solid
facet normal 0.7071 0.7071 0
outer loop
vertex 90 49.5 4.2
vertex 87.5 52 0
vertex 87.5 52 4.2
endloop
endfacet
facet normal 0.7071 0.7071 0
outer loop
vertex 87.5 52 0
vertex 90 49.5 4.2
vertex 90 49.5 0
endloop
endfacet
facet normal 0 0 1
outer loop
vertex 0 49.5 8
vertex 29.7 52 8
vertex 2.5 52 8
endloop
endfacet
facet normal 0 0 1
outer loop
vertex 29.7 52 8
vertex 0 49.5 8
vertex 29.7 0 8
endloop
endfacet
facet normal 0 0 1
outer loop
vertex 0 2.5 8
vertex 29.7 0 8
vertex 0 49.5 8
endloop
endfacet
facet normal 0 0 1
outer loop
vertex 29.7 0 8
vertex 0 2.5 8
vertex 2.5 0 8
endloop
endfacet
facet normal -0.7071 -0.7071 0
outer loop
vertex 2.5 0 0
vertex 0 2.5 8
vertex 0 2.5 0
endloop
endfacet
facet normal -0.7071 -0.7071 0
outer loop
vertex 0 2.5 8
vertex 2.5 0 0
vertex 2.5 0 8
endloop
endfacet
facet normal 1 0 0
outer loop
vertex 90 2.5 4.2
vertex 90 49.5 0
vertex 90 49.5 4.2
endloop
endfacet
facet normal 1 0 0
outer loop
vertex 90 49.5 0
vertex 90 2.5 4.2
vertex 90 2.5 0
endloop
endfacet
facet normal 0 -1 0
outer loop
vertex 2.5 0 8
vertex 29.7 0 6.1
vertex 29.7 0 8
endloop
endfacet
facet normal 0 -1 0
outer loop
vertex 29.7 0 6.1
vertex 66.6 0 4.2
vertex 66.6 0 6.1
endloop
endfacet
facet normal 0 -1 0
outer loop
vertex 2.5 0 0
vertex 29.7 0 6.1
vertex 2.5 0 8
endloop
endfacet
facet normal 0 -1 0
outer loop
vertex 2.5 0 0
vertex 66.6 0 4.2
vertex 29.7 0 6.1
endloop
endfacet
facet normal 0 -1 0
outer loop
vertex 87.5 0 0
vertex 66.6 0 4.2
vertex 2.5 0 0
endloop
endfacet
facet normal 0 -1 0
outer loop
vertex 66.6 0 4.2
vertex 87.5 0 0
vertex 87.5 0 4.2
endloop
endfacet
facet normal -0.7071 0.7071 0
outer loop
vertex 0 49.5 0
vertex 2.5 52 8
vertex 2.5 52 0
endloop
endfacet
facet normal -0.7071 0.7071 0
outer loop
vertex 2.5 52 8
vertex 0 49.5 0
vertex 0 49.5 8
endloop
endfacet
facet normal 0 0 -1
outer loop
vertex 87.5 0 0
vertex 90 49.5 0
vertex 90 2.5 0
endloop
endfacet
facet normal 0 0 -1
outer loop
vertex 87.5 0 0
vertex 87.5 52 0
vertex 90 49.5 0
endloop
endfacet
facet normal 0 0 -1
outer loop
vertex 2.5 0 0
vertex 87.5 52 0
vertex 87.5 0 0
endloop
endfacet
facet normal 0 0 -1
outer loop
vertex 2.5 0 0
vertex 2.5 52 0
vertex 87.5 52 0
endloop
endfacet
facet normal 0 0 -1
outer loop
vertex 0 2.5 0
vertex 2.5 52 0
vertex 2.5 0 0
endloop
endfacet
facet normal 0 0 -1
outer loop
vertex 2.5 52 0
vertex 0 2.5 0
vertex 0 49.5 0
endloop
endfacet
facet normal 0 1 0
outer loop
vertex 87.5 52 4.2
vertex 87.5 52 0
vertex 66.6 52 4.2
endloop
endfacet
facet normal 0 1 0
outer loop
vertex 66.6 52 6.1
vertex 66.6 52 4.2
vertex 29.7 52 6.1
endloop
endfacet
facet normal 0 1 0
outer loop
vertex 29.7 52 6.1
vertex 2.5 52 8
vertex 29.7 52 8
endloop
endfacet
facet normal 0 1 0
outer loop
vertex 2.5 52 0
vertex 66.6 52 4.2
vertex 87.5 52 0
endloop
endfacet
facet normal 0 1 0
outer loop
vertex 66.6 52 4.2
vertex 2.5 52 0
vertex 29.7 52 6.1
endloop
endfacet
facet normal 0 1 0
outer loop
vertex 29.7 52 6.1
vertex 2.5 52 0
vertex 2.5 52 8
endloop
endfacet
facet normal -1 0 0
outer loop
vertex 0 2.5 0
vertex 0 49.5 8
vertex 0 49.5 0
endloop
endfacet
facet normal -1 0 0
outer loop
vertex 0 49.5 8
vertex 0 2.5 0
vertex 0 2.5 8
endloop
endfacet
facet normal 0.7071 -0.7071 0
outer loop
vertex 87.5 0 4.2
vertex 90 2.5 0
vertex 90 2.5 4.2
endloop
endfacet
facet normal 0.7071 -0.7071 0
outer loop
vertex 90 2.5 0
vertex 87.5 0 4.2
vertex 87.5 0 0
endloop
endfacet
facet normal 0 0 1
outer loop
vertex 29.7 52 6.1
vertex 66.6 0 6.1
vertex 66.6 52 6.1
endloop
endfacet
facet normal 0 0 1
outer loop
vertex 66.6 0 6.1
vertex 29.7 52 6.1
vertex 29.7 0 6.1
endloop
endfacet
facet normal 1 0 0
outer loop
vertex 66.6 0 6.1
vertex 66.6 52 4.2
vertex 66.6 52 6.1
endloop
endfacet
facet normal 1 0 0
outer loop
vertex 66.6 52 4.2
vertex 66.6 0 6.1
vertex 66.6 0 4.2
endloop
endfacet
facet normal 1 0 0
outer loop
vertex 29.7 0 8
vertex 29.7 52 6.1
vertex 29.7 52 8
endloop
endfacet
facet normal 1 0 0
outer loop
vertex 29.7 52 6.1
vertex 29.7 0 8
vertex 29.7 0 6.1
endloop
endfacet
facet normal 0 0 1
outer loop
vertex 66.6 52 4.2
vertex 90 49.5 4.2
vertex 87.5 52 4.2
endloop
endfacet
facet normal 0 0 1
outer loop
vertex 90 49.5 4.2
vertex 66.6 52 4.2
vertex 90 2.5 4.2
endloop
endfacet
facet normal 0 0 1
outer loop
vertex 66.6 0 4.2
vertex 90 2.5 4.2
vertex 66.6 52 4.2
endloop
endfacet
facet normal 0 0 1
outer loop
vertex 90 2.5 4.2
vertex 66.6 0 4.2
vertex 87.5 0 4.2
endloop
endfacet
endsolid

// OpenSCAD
$fn = 32;

// ----------------------------------------------------------------------
// Stepped bar: twostep, 90 x 52 x 8/4.2 mm
// ----------------------------------------------------------------------

// --- parameters (mm) ---
bar_l = 90;               // bar length, X
bar_w = 52;               // bar width, Y
plate_t = 8;              // thickness of the thick zone, Z
thin_t = 4.2;             // thickness of the thin zone
corner_c = 2.5;           // corner chamfer of the bar
step_cut = 3.8;           // material removed from the thin zone
stair1_x = 29.7;          // position of the first stair
stair2_x = 66.6;          // position of the second stair
mid_t = 6.1;              // thickness of the middle zone
depth_1 = 1.9;            // depth of cut 1 from the top face
depth_2 = 3.8;            // depth of cut 2 from the top face

profile = [[2.5, 0], [87.5, 0], [90, 2.5], [90, 49.5], [87.5, 52], [2.5, 52], [0, 49.5], [0, 2.5]];  // primary outline, 8 points, counter clockwise
void_1 = [[29.7, -1], [66.6, -1], [66.6, 53], [29.7, 53]];  // first stair, 4 points
void_2 = [[66.6, -1], [91, -1], [91, 53], [66.6, 53]];  // second stair, 4 points

// --- the one profile operation ---
difference() {
  linear_extrude(height = plate_t) polygon(points = profile);
  translate([0, 0, plate_t - depth_1])
    linear_extrude(height = depth_1 + 1) polygon(points = void_1);
  translate([0, 0, plate_t - depth_2])
    linear_extrude(height = depth_2 + 1) polygon(points = void_2);
}
